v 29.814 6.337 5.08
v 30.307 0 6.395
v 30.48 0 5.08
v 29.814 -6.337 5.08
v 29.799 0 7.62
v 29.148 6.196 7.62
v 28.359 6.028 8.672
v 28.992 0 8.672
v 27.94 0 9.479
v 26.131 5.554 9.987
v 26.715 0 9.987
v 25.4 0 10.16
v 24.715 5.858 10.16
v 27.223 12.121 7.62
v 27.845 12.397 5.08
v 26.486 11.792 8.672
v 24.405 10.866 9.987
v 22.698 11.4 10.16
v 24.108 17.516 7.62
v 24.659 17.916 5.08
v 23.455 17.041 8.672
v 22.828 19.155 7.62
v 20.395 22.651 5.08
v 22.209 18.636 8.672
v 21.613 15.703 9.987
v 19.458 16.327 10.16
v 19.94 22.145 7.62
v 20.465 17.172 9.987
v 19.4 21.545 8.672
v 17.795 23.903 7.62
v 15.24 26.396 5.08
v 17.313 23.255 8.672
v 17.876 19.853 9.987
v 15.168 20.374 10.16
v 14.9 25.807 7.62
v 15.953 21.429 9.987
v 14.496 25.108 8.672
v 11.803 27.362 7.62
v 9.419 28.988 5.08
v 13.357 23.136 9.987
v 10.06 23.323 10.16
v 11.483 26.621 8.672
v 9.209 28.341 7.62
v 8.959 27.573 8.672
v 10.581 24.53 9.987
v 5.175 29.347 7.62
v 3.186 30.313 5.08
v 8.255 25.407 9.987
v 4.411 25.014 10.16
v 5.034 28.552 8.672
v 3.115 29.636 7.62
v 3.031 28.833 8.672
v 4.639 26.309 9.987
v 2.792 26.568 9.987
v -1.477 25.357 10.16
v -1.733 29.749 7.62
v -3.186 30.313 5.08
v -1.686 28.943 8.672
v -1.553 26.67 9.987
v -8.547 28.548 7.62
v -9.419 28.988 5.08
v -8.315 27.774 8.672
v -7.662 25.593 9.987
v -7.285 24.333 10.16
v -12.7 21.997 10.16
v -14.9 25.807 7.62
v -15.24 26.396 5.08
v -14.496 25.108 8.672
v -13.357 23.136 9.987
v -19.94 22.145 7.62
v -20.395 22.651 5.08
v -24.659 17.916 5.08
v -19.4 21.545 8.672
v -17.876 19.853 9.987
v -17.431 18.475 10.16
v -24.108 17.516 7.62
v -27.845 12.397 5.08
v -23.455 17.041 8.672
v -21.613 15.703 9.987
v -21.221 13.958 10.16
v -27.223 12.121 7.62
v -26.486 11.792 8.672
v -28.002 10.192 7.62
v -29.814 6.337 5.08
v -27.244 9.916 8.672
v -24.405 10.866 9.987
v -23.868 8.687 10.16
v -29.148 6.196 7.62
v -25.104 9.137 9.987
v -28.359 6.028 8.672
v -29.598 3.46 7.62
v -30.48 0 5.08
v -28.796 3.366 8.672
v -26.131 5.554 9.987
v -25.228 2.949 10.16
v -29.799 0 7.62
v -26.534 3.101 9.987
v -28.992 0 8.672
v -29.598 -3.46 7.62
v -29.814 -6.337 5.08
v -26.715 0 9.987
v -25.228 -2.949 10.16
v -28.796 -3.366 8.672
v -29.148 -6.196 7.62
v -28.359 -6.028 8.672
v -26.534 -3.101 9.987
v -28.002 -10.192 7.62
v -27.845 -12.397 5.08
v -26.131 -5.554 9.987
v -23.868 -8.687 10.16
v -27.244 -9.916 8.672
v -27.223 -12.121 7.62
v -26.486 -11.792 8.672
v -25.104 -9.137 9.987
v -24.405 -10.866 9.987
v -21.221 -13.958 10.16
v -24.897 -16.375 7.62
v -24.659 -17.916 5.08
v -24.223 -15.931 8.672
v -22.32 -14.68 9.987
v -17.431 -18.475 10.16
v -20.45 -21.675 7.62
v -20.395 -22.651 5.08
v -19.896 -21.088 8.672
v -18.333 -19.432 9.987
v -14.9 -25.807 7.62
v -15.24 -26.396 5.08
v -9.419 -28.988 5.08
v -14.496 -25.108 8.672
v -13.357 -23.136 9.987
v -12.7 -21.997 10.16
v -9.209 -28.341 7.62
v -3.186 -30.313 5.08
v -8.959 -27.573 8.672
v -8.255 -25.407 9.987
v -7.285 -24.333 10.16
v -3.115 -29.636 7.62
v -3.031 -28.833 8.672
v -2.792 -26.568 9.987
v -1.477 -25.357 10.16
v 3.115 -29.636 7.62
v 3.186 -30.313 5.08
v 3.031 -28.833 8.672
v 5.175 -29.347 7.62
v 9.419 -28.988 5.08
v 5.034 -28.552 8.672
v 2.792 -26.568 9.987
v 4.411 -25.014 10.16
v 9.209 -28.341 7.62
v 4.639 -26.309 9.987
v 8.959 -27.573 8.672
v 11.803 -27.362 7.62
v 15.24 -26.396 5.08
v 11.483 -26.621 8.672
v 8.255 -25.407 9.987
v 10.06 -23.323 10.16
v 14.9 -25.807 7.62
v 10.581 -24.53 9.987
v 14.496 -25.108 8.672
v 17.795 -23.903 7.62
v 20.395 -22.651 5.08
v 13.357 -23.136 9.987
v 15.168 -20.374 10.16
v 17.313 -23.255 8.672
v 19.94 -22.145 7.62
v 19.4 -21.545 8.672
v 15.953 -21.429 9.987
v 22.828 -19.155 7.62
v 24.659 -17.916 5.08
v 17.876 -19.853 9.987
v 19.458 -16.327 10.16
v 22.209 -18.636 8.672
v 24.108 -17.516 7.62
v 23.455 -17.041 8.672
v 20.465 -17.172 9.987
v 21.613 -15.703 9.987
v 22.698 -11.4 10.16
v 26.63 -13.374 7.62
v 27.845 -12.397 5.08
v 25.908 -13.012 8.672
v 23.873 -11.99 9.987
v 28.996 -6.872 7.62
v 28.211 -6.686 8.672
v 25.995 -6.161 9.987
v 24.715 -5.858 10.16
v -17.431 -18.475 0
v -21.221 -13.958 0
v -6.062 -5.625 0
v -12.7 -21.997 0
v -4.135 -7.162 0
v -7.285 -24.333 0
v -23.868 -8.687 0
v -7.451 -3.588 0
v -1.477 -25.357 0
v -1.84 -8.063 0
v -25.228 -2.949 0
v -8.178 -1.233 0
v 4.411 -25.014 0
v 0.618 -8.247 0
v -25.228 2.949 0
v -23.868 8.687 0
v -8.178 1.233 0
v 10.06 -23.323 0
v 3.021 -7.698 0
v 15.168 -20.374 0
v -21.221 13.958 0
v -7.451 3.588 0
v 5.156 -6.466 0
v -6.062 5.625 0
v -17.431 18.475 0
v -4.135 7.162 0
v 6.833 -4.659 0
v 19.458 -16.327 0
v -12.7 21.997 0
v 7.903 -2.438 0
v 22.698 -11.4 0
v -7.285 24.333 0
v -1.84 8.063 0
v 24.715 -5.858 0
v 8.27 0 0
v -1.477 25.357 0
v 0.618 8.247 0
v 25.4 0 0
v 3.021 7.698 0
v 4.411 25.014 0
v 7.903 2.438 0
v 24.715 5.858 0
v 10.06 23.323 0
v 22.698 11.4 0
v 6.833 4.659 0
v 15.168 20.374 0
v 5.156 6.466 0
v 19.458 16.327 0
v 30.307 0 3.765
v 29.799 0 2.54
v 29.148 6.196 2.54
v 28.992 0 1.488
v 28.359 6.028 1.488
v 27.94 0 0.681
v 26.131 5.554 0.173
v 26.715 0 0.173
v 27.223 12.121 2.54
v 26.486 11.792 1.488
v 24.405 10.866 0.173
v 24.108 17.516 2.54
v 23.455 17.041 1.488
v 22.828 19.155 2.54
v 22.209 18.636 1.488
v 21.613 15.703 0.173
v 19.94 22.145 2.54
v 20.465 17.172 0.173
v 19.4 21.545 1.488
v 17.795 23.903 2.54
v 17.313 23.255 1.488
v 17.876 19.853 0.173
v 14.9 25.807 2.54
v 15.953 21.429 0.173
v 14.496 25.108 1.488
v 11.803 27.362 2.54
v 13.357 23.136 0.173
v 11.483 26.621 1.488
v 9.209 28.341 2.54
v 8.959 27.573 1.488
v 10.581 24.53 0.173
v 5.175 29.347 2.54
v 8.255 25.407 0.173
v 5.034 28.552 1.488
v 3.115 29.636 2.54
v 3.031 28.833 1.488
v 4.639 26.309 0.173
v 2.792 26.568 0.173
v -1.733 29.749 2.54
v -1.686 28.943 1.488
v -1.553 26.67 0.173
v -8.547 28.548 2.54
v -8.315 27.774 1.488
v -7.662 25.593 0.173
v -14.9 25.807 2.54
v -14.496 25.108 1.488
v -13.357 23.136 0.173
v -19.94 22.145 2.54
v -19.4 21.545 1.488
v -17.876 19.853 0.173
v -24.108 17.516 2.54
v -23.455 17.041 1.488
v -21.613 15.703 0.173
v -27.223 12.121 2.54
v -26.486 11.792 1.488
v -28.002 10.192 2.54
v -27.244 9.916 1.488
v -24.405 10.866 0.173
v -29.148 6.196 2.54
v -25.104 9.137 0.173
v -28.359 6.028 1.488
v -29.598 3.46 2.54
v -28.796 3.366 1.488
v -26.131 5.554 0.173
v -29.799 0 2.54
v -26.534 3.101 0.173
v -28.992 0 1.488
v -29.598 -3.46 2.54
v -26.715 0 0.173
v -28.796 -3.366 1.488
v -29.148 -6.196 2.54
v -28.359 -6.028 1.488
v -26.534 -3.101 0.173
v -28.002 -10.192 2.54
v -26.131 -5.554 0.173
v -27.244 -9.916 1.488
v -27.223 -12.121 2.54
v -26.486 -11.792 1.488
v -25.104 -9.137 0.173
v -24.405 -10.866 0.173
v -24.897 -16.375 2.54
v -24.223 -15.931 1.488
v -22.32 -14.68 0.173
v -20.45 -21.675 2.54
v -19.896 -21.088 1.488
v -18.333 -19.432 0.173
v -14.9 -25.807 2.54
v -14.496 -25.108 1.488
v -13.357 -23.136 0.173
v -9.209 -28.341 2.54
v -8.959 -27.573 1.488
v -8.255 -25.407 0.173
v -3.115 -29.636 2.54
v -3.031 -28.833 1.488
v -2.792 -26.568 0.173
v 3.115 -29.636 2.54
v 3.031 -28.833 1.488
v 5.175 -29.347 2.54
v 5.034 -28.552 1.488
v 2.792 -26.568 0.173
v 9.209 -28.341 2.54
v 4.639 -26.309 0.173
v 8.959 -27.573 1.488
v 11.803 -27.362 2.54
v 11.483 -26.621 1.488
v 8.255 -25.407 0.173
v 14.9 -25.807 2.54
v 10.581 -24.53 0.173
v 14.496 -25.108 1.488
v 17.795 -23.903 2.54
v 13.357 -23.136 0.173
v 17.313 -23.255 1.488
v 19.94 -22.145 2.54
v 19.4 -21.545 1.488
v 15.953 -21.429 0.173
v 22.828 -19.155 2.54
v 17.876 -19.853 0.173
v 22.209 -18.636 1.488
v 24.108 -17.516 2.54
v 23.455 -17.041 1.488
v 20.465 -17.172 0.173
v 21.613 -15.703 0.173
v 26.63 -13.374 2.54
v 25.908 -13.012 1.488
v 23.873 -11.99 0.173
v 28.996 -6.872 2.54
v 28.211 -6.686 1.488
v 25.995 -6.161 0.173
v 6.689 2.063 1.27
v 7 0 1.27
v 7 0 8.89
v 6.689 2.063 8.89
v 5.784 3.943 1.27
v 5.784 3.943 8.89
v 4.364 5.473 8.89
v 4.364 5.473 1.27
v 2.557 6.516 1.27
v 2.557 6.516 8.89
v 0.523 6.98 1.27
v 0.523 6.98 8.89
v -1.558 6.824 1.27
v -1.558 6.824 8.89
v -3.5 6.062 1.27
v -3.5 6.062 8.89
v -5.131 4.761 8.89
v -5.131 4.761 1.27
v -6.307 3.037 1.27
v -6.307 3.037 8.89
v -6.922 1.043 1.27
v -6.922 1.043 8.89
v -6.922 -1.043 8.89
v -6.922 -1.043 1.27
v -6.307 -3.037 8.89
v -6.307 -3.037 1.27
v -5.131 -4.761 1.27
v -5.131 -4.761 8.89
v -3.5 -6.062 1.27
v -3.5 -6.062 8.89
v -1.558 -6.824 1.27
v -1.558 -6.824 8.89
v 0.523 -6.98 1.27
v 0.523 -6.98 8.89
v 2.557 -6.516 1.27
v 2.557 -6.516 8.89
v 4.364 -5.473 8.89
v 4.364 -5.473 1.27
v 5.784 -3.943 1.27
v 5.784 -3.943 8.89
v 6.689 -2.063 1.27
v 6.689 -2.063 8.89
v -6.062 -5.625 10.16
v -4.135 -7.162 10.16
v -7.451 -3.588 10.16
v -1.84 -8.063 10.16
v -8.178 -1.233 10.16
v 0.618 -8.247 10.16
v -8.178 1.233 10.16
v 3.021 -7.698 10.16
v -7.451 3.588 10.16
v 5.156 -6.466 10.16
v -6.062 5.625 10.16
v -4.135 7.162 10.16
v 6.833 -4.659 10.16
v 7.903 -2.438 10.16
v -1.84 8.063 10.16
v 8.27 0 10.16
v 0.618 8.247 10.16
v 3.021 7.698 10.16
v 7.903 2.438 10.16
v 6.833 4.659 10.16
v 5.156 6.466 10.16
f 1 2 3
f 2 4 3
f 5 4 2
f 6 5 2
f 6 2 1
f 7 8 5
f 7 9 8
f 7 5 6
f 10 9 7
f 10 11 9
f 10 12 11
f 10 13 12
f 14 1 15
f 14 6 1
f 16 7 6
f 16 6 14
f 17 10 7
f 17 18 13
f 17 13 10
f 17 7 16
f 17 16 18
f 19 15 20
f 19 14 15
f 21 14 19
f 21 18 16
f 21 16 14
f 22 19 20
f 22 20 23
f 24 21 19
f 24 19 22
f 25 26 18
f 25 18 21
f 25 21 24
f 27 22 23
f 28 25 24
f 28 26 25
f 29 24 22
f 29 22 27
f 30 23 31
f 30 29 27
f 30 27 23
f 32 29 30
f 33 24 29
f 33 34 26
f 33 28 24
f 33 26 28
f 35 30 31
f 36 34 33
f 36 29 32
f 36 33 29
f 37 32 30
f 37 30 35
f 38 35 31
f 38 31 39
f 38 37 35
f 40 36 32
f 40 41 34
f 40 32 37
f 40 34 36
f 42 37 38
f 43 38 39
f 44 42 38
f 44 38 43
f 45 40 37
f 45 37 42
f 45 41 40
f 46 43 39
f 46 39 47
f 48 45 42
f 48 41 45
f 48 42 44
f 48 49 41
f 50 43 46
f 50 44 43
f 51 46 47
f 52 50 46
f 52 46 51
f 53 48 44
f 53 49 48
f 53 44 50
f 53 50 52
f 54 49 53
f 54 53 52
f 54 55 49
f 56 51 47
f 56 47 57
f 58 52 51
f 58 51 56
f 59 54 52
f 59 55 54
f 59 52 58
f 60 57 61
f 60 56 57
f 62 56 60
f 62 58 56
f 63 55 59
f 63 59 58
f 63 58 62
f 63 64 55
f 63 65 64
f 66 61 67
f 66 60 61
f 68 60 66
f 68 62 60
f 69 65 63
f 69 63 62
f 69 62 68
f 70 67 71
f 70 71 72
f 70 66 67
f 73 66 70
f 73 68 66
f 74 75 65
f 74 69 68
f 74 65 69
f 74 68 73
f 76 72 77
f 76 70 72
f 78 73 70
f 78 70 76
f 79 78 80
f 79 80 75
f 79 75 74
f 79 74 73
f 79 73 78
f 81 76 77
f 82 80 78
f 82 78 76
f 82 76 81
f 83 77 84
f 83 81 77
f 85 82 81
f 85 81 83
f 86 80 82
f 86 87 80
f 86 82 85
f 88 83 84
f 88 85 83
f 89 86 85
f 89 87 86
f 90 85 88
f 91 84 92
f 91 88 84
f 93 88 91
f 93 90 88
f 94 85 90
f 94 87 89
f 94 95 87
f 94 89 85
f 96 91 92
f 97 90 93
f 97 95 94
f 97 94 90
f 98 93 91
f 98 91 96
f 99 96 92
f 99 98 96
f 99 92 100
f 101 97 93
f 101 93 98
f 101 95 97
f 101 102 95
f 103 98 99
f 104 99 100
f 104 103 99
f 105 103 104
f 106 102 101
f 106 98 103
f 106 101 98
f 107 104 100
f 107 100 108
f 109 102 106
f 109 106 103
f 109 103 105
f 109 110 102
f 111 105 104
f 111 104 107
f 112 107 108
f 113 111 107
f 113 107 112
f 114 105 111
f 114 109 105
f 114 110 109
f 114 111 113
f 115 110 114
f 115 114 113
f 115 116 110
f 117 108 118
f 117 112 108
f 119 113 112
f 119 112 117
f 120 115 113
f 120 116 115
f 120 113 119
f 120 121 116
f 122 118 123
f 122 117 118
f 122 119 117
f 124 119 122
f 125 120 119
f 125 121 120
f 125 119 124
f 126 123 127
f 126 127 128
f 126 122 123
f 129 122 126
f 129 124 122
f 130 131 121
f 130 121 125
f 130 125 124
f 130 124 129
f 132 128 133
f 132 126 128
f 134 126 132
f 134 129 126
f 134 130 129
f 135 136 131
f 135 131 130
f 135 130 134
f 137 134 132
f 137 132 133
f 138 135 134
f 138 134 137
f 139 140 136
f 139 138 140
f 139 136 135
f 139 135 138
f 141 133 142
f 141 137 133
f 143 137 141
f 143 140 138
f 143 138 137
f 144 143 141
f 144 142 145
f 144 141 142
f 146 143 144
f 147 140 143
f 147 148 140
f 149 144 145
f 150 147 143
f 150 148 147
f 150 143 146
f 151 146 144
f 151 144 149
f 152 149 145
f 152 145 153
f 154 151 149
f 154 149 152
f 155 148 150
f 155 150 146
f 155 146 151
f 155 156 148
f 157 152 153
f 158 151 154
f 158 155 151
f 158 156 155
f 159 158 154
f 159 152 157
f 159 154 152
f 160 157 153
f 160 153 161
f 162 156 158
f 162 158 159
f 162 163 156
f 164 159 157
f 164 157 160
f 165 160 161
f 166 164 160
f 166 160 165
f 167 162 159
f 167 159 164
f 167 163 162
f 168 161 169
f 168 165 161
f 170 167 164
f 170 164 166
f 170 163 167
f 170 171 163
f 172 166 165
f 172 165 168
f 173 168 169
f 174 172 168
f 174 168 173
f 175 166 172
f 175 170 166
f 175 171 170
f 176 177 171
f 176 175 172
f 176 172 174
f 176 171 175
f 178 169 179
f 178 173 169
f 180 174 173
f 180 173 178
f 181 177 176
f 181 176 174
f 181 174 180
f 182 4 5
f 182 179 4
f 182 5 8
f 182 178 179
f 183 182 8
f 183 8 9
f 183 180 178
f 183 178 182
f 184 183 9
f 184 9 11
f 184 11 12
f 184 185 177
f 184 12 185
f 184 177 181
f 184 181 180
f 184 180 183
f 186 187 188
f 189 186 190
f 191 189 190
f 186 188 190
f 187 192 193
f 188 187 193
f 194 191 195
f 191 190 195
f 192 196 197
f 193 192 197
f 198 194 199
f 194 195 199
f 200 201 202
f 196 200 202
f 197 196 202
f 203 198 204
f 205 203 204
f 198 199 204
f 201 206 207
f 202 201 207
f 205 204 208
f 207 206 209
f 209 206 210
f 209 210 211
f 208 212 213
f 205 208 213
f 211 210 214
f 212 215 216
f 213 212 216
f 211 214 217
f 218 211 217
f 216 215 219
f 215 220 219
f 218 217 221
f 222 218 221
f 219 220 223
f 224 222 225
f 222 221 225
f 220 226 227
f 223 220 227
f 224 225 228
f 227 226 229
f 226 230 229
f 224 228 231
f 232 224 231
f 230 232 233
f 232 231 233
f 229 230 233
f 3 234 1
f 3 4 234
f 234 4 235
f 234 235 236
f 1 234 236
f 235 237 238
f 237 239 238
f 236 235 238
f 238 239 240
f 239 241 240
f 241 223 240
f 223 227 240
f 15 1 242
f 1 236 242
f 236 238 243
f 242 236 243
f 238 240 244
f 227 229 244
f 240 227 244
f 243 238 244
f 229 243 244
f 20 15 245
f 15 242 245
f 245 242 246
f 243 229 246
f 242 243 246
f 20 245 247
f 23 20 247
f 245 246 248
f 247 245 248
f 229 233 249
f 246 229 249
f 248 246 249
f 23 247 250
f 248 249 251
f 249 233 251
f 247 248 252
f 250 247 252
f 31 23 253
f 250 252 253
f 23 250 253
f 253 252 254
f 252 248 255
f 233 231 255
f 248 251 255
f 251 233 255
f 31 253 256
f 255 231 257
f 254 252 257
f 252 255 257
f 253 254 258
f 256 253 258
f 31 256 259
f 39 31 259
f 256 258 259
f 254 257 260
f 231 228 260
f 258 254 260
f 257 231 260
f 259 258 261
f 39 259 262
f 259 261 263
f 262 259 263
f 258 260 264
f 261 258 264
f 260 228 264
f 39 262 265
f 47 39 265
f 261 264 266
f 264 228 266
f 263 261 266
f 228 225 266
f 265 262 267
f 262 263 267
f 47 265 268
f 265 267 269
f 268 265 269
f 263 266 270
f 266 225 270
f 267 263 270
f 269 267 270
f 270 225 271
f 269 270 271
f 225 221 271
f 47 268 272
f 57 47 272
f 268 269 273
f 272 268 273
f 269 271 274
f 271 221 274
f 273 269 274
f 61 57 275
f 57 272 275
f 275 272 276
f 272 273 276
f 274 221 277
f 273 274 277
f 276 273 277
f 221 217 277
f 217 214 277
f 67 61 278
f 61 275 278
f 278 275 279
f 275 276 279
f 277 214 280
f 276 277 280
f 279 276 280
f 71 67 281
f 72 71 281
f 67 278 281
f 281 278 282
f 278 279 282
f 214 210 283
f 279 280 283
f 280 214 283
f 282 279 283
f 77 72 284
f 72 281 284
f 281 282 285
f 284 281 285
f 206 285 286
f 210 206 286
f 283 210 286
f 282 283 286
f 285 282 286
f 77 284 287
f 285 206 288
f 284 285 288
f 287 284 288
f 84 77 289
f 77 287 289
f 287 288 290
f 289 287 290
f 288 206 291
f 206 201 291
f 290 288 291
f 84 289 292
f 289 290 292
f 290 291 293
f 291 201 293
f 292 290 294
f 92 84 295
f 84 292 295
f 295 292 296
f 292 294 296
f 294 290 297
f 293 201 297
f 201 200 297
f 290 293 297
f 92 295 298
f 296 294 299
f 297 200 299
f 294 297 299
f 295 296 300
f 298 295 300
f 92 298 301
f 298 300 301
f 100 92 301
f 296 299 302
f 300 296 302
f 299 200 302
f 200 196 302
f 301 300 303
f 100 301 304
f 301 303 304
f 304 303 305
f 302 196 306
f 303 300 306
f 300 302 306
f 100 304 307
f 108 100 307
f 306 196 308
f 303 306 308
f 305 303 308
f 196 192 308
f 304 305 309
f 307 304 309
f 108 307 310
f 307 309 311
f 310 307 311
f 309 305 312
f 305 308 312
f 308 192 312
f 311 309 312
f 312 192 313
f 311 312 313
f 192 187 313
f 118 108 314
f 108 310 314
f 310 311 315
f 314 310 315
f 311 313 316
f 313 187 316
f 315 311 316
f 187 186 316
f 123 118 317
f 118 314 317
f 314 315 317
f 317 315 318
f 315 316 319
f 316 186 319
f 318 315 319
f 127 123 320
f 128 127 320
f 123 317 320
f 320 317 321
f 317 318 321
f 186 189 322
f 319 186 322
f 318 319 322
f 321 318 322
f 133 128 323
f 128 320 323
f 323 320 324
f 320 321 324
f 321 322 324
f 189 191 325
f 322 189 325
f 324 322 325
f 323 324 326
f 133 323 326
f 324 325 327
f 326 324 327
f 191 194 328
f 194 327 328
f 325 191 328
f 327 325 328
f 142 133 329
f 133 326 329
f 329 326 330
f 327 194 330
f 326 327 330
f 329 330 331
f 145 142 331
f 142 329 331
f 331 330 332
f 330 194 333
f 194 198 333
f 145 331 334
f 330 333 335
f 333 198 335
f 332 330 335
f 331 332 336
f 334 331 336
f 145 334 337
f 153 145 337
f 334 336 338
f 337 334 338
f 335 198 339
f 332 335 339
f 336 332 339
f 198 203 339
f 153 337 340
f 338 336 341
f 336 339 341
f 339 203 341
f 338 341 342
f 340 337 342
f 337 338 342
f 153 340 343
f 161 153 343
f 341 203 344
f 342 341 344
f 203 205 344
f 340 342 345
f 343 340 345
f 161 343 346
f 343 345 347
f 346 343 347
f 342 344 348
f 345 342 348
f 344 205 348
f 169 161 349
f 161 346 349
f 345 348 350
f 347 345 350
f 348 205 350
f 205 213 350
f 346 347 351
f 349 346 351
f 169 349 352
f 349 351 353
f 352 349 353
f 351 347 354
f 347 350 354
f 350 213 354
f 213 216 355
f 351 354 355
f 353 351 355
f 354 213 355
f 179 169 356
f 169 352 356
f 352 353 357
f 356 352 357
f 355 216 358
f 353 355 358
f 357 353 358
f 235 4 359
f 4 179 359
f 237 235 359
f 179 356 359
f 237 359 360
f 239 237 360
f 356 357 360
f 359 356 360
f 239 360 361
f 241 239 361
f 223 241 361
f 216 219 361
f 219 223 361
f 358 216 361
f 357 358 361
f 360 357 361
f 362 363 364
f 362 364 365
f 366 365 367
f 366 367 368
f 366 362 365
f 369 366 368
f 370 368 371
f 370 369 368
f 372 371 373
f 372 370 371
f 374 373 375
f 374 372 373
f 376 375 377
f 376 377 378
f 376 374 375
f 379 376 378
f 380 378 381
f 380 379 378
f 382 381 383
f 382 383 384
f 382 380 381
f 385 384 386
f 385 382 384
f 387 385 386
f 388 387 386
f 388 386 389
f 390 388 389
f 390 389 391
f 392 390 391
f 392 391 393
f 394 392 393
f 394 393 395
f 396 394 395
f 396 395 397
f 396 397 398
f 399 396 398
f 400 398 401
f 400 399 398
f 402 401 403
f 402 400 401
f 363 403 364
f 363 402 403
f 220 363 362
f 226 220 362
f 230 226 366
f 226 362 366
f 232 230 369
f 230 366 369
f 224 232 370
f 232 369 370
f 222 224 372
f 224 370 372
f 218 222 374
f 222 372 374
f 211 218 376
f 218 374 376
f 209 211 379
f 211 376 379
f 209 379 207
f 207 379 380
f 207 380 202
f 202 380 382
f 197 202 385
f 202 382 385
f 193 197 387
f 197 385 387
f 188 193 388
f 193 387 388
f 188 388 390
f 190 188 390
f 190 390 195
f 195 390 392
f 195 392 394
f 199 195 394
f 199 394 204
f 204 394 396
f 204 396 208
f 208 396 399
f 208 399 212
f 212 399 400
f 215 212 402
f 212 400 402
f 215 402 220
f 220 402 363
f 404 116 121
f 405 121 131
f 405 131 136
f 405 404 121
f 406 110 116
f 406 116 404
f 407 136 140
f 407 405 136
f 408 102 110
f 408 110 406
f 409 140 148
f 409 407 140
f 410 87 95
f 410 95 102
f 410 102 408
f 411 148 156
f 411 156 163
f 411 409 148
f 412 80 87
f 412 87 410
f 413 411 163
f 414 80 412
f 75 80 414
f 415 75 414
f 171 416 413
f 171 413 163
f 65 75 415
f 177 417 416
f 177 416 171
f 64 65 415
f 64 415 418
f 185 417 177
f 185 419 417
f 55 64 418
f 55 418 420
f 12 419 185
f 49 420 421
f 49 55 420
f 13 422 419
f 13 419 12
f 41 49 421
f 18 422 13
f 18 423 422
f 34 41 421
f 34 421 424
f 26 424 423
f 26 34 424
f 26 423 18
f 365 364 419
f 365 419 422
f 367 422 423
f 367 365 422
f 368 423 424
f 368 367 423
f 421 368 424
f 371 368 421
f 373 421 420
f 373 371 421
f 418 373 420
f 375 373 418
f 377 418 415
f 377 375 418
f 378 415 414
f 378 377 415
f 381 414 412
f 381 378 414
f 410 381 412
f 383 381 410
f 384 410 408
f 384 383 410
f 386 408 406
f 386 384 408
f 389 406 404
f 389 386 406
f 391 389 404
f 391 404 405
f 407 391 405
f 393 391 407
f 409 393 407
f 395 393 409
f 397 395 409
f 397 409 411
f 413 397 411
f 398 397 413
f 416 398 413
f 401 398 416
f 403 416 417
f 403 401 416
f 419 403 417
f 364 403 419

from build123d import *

# Parameters (mm, degrees)
F0_R     = 30.48
F0_R_2   = 6.9999987
F1_DEPTH = 10.16
F2_R     = 5.07999
F3_SIZE  = 1.27


# Not quite as in the source:
# - a fillet or chamfer is up to 0.001 mm smaller than in the source, because OpenCascade refuses the exact size


with BuildPart() as f1:
    # F0 (on Top) → F1 (new body)
    with BuildSketch(Plane.XY):
        Circle(F0_R)
        Circle(F0_R_2, mode=Mode.SUBTRACT)
    extrude(amount=F1_DEPTH)

    # F2 (radius 5.08 in the source; OpenCascade refuses exactly that, so slightly less here)
    f2_edges = [f1.edges().sort_by_distance(p)[0] for p in [
        (-30.48, 0, 10.16),
        (-30.48, 0, 0),
    ]]
    fillet(f2_edges, radius=F2_R)

    # F3
    f3_edges = [f1.edges().sort_by_distance(p)[0] for p in [
        (-6.999999, 0, 10.16),
        (-6.999999, 0, 0),
    ]]
    chamfer(f3_edges, length=F3_SIZE)


solid = f1.part
